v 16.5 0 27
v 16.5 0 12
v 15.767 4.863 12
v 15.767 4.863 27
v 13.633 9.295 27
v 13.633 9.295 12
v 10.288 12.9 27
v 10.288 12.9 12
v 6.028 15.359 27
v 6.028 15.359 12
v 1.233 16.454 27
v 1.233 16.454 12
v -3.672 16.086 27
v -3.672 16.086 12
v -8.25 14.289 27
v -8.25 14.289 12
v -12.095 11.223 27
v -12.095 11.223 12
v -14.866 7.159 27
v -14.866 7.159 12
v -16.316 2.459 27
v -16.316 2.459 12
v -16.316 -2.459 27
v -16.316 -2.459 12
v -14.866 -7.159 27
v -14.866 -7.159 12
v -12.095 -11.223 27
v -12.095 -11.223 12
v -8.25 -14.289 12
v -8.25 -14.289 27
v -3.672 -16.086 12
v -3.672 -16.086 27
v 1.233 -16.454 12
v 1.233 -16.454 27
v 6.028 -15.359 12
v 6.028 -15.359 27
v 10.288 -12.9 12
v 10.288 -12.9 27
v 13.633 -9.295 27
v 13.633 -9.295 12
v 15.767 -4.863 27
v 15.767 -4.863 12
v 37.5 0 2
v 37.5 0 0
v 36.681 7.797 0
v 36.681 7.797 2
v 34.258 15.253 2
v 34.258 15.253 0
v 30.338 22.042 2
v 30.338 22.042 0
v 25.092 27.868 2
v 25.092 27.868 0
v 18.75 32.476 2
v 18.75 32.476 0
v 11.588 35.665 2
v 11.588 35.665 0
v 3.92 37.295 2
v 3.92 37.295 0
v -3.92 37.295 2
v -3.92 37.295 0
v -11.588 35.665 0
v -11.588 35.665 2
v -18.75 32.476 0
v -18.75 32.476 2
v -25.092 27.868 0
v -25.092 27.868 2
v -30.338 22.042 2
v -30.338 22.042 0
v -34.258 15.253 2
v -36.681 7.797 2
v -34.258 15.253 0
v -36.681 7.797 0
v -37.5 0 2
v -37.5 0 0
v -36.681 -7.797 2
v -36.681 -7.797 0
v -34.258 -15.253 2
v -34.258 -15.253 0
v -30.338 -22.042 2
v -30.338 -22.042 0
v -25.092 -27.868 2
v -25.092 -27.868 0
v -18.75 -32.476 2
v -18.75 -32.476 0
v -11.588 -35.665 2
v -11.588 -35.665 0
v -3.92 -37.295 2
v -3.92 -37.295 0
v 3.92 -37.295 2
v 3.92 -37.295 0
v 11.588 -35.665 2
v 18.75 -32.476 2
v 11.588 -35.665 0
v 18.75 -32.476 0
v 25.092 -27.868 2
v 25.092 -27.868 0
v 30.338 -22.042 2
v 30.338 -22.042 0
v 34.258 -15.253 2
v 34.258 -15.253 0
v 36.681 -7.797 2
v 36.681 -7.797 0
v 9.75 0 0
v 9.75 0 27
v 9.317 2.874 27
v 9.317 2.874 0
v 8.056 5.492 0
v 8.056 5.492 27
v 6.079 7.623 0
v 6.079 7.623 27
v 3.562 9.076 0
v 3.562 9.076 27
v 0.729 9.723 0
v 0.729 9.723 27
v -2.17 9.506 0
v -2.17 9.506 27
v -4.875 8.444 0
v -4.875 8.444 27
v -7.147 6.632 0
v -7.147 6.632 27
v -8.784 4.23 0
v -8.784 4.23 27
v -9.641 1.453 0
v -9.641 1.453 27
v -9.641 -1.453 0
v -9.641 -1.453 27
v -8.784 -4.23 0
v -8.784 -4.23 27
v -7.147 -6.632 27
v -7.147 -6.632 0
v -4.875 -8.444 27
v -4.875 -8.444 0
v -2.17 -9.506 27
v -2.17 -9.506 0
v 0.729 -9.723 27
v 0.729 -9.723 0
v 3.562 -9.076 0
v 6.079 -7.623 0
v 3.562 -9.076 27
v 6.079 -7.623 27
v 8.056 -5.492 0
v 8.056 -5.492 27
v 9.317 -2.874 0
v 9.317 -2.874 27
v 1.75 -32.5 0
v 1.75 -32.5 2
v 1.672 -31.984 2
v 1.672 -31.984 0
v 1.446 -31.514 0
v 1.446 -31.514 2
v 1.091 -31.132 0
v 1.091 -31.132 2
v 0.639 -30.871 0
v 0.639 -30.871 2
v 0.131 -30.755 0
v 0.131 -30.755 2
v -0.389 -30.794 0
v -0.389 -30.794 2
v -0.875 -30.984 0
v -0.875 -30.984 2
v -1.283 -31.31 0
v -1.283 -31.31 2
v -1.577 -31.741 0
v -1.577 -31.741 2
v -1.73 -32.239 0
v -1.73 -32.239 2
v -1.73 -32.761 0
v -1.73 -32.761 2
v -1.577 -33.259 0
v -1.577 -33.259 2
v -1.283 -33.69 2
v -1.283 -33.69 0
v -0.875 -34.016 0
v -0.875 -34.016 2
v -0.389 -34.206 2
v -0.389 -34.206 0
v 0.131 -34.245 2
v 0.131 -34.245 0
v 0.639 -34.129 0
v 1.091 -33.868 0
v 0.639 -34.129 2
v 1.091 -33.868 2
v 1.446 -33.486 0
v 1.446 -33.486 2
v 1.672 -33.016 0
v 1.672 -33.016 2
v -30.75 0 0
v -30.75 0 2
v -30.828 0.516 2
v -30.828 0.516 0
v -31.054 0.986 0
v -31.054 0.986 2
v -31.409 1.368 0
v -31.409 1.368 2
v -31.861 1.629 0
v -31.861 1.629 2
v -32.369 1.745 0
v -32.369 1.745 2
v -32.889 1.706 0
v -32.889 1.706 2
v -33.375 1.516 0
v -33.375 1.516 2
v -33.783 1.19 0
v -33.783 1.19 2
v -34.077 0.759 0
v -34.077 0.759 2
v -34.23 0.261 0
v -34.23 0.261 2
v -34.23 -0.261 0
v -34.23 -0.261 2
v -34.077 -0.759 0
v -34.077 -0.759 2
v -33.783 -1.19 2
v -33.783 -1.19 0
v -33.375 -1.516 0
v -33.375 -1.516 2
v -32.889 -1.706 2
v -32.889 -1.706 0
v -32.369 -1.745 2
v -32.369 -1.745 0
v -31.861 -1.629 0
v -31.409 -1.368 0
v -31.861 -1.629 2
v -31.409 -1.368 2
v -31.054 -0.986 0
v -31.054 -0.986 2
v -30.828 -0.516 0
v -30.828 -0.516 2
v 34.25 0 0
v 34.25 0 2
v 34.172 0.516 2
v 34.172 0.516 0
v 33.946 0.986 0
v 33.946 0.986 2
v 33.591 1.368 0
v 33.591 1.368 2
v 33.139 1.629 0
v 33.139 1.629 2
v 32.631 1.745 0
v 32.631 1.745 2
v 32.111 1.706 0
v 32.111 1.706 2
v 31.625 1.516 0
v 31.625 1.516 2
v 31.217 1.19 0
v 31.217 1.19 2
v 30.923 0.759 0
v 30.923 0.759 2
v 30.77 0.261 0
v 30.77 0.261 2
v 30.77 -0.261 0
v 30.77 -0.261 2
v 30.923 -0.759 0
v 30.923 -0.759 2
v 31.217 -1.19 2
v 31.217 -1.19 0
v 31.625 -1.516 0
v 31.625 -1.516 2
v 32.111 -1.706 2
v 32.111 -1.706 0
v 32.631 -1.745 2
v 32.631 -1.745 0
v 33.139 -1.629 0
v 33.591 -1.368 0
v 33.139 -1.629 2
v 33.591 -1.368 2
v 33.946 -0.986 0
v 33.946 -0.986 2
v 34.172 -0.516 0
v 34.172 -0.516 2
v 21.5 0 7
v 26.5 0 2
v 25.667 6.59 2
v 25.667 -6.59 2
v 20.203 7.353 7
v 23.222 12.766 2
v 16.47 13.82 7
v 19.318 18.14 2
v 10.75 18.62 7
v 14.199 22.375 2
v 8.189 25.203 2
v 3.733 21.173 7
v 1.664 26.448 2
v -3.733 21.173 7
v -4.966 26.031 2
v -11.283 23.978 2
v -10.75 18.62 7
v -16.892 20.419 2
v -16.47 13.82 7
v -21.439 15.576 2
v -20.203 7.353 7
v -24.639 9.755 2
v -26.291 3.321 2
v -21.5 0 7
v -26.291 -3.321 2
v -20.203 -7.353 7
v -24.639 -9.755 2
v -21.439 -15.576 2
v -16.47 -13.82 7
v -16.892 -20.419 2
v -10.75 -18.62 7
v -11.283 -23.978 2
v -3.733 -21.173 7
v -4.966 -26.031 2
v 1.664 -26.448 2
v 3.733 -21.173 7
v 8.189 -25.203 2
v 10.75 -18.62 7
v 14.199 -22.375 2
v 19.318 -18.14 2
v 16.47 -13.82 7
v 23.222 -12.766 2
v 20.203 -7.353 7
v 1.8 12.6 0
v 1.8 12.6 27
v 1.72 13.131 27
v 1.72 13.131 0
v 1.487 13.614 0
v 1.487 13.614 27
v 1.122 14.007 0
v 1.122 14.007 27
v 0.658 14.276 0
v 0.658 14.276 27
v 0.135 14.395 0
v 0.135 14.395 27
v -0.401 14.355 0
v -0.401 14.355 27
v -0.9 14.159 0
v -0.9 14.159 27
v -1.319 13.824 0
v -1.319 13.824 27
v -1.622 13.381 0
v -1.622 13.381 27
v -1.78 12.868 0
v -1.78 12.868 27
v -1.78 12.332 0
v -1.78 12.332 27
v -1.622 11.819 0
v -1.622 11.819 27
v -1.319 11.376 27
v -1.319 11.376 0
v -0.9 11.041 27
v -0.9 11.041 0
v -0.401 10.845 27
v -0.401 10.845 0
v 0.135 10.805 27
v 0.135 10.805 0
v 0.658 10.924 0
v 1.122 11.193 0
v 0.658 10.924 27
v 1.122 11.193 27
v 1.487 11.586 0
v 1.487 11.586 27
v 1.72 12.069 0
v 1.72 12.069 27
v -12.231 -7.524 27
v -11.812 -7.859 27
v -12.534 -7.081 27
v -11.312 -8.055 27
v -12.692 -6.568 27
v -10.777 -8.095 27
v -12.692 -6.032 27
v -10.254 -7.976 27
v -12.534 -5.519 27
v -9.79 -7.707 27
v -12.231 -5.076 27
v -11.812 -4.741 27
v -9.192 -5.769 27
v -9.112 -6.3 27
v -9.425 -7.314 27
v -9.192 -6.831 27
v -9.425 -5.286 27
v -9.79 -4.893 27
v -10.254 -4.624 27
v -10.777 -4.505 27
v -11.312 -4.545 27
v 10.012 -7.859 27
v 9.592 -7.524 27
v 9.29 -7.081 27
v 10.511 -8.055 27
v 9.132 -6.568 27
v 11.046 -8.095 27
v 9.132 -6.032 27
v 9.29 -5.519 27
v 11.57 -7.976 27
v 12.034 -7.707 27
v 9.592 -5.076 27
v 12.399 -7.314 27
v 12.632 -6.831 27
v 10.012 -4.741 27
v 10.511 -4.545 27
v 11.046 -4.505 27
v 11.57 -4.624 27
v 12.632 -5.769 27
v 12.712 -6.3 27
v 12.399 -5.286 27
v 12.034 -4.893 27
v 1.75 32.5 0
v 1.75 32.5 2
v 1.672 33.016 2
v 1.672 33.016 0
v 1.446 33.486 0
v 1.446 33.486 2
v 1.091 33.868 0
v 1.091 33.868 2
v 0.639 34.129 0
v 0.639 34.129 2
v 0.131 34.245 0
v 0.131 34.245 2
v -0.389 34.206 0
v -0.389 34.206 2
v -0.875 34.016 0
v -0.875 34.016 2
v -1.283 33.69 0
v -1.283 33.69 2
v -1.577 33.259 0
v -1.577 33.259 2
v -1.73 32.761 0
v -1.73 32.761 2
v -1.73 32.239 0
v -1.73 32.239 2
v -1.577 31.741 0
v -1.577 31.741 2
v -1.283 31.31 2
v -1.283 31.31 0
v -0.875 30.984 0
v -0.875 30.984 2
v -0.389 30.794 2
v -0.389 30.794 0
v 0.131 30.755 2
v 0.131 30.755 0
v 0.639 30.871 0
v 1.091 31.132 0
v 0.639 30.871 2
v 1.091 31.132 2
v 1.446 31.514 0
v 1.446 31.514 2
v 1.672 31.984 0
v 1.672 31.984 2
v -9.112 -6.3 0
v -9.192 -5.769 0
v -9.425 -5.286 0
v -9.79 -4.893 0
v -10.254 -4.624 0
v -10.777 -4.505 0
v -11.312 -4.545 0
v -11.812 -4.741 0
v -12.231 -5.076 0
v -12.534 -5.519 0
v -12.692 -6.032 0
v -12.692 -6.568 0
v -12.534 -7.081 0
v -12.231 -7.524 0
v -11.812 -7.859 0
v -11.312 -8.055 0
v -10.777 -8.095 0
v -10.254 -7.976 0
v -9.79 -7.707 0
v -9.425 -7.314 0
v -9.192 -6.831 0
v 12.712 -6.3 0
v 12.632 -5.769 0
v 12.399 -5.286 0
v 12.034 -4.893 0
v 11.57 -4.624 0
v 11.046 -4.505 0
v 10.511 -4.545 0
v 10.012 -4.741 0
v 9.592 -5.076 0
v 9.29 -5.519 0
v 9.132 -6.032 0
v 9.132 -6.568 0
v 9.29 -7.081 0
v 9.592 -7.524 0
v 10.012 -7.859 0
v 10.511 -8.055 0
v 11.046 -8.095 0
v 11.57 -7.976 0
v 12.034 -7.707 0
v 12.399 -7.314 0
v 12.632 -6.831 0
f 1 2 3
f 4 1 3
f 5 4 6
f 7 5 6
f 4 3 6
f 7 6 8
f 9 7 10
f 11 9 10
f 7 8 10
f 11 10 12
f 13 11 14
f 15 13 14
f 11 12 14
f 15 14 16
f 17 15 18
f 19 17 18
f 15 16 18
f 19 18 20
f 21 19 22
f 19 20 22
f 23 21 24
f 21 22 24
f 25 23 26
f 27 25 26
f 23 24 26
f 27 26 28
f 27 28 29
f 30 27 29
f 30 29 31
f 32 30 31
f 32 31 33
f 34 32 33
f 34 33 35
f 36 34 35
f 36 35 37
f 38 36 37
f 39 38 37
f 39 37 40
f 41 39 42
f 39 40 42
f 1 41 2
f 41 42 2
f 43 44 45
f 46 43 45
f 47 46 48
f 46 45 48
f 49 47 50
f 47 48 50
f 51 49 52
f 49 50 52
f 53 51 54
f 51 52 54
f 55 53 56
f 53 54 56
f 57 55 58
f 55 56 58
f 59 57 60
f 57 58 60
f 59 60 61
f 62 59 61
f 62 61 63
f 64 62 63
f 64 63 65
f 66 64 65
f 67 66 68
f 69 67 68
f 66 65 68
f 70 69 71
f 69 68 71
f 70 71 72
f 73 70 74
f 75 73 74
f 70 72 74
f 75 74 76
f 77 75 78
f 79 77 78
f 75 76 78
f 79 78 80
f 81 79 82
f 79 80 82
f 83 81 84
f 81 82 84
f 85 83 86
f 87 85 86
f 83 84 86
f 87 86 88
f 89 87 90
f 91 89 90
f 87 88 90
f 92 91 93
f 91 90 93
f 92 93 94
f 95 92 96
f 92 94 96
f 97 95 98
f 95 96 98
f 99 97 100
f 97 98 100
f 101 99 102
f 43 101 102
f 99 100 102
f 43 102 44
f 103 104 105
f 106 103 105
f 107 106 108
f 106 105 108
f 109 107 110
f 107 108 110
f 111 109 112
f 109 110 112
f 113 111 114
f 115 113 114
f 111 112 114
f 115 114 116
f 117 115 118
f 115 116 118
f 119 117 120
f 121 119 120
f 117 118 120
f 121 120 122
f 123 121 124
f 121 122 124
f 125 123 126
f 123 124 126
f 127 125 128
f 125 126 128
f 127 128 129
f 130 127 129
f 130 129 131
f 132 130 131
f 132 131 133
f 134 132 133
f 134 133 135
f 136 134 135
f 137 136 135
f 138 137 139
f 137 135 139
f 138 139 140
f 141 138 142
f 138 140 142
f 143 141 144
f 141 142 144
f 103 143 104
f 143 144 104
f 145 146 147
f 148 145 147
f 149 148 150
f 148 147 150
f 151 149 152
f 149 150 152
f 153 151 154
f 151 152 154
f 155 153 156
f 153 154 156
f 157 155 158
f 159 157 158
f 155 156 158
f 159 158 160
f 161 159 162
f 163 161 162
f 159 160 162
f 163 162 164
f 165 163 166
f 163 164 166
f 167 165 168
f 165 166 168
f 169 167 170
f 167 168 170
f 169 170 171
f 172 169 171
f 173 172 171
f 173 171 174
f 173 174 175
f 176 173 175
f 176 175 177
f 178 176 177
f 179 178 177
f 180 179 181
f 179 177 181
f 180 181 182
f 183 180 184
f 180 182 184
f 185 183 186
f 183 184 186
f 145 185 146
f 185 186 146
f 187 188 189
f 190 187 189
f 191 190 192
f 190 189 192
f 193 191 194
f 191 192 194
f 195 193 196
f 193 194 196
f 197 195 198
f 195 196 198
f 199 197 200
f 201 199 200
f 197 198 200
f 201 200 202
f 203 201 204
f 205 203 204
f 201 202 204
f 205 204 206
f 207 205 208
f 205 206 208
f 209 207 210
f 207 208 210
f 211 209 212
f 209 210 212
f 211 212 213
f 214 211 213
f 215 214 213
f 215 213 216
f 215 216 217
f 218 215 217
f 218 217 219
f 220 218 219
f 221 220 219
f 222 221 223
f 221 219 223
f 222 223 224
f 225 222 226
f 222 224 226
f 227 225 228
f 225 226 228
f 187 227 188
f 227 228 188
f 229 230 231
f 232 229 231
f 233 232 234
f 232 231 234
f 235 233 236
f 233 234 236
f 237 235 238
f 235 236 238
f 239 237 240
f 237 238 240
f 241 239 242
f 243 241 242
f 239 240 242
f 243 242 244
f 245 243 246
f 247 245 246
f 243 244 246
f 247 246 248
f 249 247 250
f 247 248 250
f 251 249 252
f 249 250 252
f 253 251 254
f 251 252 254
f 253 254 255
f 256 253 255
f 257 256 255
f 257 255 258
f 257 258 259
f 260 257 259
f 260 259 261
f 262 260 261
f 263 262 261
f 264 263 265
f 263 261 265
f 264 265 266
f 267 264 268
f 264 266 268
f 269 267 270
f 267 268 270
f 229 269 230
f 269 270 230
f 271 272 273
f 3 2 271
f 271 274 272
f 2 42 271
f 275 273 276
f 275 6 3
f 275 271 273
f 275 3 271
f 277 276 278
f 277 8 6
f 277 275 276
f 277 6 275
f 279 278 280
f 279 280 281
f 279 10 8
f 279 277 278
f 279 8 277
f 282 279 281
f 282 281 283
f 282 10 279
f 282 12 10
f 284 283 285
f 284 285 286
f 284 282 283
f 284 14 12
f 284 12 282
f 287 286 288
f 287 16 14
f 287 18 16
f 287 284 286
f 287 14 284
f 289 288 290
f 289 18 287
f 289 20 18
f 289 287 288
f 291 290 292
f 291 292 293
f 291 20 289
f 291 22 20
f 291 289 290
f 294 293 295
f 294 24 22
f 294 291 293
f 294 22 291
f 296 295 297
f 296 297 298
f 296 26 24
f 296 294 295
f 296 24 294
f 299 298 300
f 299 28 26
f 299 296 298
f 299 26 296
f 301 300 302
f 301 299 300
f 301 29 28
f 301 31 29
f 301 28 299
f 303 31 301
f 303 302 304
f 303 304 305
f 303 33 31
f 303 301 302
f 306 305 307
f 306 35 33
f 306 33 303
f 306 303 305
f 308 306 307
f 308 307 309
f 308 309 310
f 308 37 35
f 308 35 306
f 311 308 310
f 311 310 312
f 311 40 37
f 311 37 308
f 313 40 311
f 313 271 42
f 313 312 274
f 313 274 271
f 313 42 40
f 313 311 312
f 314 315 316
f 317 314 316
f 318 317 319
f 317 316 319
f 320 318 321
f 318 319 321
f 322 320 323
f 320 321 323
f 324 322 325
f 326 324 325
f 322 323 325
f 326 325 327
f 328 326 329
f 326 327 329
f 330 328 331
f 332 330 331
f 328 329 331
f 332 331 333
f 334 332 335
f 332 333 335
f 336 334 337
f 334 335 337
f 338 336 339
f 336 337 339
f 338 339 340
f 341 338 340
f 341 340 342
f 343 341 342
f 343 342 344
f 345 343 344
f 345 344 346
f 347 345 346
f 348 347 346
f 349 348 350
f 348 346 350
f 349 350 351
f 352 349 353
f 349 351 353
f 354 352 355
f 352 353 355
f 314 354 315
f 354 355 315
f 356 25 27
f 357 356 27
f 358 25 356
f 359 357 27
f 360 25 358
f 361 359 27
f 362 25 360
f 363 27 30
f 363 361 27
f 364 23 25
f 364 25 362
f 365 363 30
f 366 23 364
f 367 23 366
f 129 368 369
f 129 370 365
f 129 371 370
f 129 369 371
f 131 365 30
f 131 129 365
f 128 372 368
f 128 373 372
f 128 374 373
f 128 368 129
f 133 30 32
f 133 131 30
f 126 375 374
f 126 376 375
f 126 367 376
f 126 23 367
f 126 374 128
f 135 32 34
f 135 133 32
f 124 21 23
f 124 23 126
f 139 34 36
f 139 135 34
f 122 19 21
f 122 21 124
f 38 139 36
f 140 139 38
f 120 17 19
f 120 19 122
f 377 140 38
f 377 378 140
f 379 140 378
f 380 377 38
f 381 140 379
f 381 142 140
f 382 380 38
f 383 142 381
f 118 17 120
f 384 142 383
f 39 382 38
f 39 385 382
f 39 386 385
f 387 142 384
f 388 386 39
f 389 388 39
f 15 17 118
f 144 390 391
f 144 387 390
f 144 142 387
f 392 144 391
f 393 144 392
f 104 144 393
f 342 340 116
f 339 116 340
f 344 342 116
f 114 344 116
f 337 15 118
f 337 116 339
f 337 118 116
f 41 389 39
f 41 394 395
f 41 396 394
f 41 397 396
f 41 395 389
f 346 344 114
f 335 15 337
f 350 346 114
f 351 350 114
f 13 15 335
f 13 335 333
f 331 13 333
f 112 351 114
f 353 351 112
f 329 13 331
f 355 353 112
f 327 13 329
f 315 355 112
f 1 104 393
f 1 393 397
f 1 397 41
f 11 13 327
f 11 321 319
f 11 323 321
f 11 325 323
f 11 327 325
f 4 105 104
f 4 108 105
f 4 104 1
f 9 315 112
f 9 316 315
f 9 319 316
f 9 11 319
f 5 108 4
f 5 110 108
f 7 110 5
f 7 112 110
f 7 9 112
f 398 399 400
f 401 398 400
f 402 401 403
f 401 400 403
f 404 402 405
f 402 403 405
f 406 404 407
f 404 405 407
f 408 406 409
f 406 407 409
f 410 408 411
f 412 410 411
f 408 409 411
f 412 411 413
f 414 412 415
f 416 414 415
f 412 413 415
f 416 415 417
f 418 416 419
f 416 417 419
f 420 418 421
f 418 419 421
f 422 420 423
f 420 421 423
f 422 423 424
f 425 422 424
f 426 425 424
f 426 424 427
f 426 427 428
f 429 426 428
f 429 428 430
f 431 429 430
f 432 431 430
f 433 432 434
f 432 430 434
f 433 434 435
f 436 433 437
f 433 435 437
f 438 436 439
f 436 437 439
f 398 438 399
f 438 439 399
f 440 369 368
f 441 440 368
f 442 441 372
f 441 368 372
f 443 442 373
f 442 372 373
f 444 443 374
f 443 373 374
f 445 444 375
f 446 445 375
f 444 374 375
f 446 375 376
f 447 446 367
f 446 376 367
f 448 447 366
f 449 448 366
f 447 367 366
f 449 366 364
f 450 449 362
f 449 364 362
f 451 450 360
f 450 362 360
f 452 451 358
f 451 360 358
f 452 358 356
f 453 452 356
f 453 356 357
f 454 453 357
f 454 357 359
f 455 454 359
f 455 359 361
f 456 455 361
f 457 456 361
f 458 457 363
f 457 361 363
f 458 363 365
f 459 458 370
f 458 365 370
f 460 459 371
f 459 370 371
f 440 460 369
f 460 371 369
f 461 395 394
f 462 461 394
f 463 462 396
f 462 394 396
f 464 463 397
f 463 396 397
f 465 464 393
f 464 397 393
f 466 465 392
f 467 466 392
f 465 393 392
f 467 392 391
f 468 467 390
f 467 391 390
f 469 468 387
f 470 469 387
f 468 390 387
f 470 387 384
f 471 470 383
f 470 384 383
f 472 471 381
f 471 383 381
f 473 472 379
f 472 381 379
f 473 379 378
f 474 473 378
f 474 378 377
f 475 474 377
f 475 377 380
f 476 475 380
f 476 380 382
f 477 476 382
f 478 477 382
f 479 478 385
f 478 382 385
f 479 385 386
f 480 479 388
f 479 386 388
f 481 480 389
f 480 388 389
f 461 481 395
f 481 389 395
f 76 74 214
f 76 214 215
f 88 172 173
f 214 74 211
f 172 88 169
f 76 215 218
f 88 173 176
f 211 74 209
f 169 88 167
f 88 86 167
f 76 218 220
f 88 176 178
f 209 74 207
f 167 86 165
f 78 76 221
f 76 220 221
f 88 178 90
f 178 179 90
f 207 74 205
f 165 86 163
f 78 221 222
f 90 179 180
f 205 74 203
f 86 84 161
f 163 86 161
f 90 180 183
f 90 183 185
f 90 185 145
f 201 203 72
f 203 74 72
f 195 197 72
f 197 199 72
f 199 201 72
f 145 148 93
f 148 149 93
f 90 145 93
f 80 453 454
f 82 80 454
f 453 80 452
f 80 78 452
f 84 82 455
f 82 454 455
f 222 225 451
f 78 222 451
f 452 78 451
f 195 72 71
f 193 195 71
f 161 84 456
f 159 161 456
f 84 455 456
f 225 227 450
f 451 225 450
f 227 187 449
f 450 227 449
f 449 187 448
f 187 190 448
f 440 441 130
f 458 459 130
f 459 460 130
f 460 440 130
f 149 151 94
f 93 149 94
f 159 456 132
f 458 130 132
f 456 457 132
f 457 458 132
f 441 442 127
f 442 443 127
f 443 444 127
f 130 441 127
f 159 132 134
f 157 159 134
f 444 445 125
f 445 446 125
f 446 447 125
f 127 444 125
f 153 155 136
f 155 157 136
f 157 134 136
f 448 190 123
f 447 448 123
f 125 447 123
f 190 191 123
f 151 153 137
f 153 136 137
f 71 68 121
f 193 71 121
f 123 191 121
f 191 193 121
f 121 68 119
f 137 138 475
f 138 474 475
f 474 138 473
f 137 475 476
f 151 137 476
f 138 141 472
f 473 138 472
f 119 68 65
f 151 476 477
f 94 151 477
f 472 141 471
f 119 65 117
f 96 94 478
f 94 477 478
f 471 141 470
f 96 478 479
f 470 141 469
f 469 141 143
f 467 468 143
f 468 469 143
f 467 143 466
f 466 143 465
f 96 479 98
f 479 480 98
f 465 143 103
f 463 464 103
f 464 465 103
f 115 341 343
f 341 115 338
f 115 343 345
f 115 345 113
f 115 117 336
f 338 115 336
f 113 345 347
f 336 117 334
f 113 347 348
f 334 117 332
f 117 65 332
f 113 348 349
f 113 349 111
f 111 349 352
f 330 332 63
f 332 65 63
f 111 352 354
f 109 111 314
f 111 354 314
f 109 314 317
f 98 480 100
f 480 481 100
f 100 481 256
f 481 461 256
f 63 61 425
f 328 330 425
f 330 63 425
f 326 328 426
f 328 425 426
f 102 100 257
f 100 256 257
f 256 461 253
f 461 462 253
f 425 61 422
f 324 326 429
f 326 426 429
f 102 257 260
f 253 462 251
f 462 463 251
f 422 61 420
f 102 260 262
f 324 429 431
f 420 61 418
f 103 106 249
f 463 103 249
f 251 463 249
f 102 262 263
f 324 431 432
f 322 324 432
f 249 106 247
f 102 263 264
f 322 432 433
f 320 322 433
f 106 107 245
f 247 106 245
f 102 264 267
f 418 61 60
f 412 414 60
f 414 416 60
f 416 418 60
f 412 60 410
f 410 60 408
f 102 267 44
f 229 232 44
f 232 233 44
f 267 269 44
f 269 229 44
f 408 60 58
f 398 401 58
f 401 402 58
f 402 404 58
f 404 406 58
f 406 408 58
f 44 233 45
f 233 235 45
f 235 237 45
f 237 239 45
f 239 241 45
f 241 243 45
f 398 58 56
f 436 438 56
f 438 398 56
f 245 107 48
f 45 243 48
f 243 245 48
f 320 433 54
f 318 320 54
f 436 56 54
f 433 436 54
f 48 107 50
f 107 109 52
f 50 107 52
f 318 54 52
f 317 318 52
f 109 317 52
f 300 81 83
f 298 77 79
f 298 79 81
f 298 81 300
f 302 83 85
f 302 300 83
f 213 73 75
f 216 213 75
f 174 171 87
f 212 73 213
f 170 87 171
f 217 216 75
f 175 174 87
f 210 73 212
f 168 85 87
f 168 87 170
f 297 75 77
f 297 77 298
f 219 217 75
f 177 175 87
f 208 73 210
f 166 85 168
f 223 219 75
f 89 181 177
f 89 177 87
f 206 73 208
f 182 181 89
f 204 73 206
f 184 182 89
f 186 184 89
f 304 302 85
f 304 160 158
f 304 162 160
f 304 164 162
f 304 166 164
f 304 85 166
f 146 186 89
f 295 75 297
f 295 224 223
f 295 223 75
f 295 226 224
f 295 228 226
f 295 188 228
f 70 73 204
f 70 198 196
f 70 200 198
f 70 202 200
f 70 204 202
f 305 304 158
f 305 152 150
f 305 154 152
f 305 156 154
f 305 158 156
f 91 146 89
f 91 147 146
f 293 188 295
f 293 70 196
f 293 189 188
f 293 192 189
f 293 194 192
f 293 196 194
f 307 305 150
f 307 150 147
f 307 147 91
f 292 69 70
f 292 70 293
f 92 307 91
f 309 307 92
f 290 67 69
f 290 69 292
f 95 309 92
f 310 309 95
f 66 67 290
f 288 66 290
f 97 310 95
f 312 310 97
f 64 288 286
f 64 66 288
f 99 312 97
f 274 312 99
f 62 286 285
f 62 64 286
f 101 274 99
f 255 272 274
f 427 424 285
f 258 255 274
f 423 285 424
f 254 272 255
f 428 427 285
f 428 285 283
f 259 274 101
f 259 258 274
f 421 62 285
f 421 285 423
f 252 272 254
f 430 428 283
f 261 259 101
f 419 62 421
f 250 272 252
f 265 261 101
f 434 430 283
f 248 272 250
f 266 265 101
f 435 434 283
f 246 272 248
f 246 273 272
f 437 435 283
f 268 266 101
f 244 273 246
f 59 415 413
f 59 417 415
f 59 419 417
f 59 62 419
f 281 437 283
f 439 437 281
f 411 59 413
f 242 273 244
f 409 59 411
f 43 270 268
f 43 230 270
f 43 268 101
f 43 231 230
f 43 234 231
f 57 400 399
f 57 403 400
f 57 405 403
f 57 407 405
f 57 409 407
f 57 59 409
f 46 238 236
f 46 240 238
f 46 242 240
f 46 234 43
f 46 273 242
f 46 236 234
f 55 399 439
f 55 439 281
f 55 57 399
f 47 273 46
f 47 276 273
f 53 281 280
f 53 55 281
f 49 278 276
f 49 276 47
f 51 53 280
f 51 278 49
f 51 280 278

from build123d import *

# Parameters (mm, degrees)
SKETCH_1_R          = 37.5
EXTRUDE_1_DEPTH     = 2
SKETCH_2_R          = 1.75
CUT_EXTRUDE_1_DEPTH = 2
SKETCH_3_R          = 16.5
EXTRUDE_2_DEPTH     = 25
SKETCH_4_R          = 9.75
SKETCH_4_R_2        = 1.8
CUT_EXTRUDE_2_DEPTH = 27
CHAMFER_1_SIZE      = 10


with BuildPart() as part:
    # Эскиз1 → Бобышка-Вытянуть1 (new body)
    with BuildSketch(Plane.XY):
        Circle(SKETCH_1_R)
    extrude(amount=EXTRUDE_1_DEPTH)

    # Эскиз2 → Вырез-Вытянуть1 (cut)
    with BuildSketch(Plane.XY.offset(2)):
        with Locations((0, 32.5)):
            Circle(SKETCH_2_R)
        with Locations((32.5, 0)):
            Circle(SKETCH_2_R)
        with Locations((0, -32.5)):
            Circle(SKETCH_2_R)
        with Locations((-32.5, 0)):
            Circle(SKETCH_2_R)
    extrude(amount=-CUT_EXTRUDE_1_DEPTH, mode=Mode.SUBTRACT)

    # Эскиз3 → Бобышка-Вытянуть2 (add)
    with BuildSketch(Plane.XY.offset(2)):
        Circle(SKETCH_3_R)
    extrude(amount=EXTRUDE_2_DEPTH)

    # Эскиз4 → Вырез-Вытянуть2 (cut)
    with BuildSketch(Plane.XY.offset(27)):
        Circle(SKETCH_4_R)
        with Locations((0, 12.6)):
            Circle(SKETCH_4_R_2)
        with Locations((10.911920088, -6.3)):
            Circle(SKETCH_4_R_2)
        with Locations((-10.911920088, -6.3)):
            Circle(SKETCH_4_R_2)
    extrude(amount=-CUT_EXTRUDE_2_DEPTH, mode=Mode.SUBTRACT)

    # Фаска1
    chamfer_1_edges = [part.edges().sort_by_distance(p)[0] for p in [
        (-16.5, 0, 2),
    ]]
    chamfer(chamfer_1_edges, length=CHAMFER_1_SIZE)


solid = part.part
